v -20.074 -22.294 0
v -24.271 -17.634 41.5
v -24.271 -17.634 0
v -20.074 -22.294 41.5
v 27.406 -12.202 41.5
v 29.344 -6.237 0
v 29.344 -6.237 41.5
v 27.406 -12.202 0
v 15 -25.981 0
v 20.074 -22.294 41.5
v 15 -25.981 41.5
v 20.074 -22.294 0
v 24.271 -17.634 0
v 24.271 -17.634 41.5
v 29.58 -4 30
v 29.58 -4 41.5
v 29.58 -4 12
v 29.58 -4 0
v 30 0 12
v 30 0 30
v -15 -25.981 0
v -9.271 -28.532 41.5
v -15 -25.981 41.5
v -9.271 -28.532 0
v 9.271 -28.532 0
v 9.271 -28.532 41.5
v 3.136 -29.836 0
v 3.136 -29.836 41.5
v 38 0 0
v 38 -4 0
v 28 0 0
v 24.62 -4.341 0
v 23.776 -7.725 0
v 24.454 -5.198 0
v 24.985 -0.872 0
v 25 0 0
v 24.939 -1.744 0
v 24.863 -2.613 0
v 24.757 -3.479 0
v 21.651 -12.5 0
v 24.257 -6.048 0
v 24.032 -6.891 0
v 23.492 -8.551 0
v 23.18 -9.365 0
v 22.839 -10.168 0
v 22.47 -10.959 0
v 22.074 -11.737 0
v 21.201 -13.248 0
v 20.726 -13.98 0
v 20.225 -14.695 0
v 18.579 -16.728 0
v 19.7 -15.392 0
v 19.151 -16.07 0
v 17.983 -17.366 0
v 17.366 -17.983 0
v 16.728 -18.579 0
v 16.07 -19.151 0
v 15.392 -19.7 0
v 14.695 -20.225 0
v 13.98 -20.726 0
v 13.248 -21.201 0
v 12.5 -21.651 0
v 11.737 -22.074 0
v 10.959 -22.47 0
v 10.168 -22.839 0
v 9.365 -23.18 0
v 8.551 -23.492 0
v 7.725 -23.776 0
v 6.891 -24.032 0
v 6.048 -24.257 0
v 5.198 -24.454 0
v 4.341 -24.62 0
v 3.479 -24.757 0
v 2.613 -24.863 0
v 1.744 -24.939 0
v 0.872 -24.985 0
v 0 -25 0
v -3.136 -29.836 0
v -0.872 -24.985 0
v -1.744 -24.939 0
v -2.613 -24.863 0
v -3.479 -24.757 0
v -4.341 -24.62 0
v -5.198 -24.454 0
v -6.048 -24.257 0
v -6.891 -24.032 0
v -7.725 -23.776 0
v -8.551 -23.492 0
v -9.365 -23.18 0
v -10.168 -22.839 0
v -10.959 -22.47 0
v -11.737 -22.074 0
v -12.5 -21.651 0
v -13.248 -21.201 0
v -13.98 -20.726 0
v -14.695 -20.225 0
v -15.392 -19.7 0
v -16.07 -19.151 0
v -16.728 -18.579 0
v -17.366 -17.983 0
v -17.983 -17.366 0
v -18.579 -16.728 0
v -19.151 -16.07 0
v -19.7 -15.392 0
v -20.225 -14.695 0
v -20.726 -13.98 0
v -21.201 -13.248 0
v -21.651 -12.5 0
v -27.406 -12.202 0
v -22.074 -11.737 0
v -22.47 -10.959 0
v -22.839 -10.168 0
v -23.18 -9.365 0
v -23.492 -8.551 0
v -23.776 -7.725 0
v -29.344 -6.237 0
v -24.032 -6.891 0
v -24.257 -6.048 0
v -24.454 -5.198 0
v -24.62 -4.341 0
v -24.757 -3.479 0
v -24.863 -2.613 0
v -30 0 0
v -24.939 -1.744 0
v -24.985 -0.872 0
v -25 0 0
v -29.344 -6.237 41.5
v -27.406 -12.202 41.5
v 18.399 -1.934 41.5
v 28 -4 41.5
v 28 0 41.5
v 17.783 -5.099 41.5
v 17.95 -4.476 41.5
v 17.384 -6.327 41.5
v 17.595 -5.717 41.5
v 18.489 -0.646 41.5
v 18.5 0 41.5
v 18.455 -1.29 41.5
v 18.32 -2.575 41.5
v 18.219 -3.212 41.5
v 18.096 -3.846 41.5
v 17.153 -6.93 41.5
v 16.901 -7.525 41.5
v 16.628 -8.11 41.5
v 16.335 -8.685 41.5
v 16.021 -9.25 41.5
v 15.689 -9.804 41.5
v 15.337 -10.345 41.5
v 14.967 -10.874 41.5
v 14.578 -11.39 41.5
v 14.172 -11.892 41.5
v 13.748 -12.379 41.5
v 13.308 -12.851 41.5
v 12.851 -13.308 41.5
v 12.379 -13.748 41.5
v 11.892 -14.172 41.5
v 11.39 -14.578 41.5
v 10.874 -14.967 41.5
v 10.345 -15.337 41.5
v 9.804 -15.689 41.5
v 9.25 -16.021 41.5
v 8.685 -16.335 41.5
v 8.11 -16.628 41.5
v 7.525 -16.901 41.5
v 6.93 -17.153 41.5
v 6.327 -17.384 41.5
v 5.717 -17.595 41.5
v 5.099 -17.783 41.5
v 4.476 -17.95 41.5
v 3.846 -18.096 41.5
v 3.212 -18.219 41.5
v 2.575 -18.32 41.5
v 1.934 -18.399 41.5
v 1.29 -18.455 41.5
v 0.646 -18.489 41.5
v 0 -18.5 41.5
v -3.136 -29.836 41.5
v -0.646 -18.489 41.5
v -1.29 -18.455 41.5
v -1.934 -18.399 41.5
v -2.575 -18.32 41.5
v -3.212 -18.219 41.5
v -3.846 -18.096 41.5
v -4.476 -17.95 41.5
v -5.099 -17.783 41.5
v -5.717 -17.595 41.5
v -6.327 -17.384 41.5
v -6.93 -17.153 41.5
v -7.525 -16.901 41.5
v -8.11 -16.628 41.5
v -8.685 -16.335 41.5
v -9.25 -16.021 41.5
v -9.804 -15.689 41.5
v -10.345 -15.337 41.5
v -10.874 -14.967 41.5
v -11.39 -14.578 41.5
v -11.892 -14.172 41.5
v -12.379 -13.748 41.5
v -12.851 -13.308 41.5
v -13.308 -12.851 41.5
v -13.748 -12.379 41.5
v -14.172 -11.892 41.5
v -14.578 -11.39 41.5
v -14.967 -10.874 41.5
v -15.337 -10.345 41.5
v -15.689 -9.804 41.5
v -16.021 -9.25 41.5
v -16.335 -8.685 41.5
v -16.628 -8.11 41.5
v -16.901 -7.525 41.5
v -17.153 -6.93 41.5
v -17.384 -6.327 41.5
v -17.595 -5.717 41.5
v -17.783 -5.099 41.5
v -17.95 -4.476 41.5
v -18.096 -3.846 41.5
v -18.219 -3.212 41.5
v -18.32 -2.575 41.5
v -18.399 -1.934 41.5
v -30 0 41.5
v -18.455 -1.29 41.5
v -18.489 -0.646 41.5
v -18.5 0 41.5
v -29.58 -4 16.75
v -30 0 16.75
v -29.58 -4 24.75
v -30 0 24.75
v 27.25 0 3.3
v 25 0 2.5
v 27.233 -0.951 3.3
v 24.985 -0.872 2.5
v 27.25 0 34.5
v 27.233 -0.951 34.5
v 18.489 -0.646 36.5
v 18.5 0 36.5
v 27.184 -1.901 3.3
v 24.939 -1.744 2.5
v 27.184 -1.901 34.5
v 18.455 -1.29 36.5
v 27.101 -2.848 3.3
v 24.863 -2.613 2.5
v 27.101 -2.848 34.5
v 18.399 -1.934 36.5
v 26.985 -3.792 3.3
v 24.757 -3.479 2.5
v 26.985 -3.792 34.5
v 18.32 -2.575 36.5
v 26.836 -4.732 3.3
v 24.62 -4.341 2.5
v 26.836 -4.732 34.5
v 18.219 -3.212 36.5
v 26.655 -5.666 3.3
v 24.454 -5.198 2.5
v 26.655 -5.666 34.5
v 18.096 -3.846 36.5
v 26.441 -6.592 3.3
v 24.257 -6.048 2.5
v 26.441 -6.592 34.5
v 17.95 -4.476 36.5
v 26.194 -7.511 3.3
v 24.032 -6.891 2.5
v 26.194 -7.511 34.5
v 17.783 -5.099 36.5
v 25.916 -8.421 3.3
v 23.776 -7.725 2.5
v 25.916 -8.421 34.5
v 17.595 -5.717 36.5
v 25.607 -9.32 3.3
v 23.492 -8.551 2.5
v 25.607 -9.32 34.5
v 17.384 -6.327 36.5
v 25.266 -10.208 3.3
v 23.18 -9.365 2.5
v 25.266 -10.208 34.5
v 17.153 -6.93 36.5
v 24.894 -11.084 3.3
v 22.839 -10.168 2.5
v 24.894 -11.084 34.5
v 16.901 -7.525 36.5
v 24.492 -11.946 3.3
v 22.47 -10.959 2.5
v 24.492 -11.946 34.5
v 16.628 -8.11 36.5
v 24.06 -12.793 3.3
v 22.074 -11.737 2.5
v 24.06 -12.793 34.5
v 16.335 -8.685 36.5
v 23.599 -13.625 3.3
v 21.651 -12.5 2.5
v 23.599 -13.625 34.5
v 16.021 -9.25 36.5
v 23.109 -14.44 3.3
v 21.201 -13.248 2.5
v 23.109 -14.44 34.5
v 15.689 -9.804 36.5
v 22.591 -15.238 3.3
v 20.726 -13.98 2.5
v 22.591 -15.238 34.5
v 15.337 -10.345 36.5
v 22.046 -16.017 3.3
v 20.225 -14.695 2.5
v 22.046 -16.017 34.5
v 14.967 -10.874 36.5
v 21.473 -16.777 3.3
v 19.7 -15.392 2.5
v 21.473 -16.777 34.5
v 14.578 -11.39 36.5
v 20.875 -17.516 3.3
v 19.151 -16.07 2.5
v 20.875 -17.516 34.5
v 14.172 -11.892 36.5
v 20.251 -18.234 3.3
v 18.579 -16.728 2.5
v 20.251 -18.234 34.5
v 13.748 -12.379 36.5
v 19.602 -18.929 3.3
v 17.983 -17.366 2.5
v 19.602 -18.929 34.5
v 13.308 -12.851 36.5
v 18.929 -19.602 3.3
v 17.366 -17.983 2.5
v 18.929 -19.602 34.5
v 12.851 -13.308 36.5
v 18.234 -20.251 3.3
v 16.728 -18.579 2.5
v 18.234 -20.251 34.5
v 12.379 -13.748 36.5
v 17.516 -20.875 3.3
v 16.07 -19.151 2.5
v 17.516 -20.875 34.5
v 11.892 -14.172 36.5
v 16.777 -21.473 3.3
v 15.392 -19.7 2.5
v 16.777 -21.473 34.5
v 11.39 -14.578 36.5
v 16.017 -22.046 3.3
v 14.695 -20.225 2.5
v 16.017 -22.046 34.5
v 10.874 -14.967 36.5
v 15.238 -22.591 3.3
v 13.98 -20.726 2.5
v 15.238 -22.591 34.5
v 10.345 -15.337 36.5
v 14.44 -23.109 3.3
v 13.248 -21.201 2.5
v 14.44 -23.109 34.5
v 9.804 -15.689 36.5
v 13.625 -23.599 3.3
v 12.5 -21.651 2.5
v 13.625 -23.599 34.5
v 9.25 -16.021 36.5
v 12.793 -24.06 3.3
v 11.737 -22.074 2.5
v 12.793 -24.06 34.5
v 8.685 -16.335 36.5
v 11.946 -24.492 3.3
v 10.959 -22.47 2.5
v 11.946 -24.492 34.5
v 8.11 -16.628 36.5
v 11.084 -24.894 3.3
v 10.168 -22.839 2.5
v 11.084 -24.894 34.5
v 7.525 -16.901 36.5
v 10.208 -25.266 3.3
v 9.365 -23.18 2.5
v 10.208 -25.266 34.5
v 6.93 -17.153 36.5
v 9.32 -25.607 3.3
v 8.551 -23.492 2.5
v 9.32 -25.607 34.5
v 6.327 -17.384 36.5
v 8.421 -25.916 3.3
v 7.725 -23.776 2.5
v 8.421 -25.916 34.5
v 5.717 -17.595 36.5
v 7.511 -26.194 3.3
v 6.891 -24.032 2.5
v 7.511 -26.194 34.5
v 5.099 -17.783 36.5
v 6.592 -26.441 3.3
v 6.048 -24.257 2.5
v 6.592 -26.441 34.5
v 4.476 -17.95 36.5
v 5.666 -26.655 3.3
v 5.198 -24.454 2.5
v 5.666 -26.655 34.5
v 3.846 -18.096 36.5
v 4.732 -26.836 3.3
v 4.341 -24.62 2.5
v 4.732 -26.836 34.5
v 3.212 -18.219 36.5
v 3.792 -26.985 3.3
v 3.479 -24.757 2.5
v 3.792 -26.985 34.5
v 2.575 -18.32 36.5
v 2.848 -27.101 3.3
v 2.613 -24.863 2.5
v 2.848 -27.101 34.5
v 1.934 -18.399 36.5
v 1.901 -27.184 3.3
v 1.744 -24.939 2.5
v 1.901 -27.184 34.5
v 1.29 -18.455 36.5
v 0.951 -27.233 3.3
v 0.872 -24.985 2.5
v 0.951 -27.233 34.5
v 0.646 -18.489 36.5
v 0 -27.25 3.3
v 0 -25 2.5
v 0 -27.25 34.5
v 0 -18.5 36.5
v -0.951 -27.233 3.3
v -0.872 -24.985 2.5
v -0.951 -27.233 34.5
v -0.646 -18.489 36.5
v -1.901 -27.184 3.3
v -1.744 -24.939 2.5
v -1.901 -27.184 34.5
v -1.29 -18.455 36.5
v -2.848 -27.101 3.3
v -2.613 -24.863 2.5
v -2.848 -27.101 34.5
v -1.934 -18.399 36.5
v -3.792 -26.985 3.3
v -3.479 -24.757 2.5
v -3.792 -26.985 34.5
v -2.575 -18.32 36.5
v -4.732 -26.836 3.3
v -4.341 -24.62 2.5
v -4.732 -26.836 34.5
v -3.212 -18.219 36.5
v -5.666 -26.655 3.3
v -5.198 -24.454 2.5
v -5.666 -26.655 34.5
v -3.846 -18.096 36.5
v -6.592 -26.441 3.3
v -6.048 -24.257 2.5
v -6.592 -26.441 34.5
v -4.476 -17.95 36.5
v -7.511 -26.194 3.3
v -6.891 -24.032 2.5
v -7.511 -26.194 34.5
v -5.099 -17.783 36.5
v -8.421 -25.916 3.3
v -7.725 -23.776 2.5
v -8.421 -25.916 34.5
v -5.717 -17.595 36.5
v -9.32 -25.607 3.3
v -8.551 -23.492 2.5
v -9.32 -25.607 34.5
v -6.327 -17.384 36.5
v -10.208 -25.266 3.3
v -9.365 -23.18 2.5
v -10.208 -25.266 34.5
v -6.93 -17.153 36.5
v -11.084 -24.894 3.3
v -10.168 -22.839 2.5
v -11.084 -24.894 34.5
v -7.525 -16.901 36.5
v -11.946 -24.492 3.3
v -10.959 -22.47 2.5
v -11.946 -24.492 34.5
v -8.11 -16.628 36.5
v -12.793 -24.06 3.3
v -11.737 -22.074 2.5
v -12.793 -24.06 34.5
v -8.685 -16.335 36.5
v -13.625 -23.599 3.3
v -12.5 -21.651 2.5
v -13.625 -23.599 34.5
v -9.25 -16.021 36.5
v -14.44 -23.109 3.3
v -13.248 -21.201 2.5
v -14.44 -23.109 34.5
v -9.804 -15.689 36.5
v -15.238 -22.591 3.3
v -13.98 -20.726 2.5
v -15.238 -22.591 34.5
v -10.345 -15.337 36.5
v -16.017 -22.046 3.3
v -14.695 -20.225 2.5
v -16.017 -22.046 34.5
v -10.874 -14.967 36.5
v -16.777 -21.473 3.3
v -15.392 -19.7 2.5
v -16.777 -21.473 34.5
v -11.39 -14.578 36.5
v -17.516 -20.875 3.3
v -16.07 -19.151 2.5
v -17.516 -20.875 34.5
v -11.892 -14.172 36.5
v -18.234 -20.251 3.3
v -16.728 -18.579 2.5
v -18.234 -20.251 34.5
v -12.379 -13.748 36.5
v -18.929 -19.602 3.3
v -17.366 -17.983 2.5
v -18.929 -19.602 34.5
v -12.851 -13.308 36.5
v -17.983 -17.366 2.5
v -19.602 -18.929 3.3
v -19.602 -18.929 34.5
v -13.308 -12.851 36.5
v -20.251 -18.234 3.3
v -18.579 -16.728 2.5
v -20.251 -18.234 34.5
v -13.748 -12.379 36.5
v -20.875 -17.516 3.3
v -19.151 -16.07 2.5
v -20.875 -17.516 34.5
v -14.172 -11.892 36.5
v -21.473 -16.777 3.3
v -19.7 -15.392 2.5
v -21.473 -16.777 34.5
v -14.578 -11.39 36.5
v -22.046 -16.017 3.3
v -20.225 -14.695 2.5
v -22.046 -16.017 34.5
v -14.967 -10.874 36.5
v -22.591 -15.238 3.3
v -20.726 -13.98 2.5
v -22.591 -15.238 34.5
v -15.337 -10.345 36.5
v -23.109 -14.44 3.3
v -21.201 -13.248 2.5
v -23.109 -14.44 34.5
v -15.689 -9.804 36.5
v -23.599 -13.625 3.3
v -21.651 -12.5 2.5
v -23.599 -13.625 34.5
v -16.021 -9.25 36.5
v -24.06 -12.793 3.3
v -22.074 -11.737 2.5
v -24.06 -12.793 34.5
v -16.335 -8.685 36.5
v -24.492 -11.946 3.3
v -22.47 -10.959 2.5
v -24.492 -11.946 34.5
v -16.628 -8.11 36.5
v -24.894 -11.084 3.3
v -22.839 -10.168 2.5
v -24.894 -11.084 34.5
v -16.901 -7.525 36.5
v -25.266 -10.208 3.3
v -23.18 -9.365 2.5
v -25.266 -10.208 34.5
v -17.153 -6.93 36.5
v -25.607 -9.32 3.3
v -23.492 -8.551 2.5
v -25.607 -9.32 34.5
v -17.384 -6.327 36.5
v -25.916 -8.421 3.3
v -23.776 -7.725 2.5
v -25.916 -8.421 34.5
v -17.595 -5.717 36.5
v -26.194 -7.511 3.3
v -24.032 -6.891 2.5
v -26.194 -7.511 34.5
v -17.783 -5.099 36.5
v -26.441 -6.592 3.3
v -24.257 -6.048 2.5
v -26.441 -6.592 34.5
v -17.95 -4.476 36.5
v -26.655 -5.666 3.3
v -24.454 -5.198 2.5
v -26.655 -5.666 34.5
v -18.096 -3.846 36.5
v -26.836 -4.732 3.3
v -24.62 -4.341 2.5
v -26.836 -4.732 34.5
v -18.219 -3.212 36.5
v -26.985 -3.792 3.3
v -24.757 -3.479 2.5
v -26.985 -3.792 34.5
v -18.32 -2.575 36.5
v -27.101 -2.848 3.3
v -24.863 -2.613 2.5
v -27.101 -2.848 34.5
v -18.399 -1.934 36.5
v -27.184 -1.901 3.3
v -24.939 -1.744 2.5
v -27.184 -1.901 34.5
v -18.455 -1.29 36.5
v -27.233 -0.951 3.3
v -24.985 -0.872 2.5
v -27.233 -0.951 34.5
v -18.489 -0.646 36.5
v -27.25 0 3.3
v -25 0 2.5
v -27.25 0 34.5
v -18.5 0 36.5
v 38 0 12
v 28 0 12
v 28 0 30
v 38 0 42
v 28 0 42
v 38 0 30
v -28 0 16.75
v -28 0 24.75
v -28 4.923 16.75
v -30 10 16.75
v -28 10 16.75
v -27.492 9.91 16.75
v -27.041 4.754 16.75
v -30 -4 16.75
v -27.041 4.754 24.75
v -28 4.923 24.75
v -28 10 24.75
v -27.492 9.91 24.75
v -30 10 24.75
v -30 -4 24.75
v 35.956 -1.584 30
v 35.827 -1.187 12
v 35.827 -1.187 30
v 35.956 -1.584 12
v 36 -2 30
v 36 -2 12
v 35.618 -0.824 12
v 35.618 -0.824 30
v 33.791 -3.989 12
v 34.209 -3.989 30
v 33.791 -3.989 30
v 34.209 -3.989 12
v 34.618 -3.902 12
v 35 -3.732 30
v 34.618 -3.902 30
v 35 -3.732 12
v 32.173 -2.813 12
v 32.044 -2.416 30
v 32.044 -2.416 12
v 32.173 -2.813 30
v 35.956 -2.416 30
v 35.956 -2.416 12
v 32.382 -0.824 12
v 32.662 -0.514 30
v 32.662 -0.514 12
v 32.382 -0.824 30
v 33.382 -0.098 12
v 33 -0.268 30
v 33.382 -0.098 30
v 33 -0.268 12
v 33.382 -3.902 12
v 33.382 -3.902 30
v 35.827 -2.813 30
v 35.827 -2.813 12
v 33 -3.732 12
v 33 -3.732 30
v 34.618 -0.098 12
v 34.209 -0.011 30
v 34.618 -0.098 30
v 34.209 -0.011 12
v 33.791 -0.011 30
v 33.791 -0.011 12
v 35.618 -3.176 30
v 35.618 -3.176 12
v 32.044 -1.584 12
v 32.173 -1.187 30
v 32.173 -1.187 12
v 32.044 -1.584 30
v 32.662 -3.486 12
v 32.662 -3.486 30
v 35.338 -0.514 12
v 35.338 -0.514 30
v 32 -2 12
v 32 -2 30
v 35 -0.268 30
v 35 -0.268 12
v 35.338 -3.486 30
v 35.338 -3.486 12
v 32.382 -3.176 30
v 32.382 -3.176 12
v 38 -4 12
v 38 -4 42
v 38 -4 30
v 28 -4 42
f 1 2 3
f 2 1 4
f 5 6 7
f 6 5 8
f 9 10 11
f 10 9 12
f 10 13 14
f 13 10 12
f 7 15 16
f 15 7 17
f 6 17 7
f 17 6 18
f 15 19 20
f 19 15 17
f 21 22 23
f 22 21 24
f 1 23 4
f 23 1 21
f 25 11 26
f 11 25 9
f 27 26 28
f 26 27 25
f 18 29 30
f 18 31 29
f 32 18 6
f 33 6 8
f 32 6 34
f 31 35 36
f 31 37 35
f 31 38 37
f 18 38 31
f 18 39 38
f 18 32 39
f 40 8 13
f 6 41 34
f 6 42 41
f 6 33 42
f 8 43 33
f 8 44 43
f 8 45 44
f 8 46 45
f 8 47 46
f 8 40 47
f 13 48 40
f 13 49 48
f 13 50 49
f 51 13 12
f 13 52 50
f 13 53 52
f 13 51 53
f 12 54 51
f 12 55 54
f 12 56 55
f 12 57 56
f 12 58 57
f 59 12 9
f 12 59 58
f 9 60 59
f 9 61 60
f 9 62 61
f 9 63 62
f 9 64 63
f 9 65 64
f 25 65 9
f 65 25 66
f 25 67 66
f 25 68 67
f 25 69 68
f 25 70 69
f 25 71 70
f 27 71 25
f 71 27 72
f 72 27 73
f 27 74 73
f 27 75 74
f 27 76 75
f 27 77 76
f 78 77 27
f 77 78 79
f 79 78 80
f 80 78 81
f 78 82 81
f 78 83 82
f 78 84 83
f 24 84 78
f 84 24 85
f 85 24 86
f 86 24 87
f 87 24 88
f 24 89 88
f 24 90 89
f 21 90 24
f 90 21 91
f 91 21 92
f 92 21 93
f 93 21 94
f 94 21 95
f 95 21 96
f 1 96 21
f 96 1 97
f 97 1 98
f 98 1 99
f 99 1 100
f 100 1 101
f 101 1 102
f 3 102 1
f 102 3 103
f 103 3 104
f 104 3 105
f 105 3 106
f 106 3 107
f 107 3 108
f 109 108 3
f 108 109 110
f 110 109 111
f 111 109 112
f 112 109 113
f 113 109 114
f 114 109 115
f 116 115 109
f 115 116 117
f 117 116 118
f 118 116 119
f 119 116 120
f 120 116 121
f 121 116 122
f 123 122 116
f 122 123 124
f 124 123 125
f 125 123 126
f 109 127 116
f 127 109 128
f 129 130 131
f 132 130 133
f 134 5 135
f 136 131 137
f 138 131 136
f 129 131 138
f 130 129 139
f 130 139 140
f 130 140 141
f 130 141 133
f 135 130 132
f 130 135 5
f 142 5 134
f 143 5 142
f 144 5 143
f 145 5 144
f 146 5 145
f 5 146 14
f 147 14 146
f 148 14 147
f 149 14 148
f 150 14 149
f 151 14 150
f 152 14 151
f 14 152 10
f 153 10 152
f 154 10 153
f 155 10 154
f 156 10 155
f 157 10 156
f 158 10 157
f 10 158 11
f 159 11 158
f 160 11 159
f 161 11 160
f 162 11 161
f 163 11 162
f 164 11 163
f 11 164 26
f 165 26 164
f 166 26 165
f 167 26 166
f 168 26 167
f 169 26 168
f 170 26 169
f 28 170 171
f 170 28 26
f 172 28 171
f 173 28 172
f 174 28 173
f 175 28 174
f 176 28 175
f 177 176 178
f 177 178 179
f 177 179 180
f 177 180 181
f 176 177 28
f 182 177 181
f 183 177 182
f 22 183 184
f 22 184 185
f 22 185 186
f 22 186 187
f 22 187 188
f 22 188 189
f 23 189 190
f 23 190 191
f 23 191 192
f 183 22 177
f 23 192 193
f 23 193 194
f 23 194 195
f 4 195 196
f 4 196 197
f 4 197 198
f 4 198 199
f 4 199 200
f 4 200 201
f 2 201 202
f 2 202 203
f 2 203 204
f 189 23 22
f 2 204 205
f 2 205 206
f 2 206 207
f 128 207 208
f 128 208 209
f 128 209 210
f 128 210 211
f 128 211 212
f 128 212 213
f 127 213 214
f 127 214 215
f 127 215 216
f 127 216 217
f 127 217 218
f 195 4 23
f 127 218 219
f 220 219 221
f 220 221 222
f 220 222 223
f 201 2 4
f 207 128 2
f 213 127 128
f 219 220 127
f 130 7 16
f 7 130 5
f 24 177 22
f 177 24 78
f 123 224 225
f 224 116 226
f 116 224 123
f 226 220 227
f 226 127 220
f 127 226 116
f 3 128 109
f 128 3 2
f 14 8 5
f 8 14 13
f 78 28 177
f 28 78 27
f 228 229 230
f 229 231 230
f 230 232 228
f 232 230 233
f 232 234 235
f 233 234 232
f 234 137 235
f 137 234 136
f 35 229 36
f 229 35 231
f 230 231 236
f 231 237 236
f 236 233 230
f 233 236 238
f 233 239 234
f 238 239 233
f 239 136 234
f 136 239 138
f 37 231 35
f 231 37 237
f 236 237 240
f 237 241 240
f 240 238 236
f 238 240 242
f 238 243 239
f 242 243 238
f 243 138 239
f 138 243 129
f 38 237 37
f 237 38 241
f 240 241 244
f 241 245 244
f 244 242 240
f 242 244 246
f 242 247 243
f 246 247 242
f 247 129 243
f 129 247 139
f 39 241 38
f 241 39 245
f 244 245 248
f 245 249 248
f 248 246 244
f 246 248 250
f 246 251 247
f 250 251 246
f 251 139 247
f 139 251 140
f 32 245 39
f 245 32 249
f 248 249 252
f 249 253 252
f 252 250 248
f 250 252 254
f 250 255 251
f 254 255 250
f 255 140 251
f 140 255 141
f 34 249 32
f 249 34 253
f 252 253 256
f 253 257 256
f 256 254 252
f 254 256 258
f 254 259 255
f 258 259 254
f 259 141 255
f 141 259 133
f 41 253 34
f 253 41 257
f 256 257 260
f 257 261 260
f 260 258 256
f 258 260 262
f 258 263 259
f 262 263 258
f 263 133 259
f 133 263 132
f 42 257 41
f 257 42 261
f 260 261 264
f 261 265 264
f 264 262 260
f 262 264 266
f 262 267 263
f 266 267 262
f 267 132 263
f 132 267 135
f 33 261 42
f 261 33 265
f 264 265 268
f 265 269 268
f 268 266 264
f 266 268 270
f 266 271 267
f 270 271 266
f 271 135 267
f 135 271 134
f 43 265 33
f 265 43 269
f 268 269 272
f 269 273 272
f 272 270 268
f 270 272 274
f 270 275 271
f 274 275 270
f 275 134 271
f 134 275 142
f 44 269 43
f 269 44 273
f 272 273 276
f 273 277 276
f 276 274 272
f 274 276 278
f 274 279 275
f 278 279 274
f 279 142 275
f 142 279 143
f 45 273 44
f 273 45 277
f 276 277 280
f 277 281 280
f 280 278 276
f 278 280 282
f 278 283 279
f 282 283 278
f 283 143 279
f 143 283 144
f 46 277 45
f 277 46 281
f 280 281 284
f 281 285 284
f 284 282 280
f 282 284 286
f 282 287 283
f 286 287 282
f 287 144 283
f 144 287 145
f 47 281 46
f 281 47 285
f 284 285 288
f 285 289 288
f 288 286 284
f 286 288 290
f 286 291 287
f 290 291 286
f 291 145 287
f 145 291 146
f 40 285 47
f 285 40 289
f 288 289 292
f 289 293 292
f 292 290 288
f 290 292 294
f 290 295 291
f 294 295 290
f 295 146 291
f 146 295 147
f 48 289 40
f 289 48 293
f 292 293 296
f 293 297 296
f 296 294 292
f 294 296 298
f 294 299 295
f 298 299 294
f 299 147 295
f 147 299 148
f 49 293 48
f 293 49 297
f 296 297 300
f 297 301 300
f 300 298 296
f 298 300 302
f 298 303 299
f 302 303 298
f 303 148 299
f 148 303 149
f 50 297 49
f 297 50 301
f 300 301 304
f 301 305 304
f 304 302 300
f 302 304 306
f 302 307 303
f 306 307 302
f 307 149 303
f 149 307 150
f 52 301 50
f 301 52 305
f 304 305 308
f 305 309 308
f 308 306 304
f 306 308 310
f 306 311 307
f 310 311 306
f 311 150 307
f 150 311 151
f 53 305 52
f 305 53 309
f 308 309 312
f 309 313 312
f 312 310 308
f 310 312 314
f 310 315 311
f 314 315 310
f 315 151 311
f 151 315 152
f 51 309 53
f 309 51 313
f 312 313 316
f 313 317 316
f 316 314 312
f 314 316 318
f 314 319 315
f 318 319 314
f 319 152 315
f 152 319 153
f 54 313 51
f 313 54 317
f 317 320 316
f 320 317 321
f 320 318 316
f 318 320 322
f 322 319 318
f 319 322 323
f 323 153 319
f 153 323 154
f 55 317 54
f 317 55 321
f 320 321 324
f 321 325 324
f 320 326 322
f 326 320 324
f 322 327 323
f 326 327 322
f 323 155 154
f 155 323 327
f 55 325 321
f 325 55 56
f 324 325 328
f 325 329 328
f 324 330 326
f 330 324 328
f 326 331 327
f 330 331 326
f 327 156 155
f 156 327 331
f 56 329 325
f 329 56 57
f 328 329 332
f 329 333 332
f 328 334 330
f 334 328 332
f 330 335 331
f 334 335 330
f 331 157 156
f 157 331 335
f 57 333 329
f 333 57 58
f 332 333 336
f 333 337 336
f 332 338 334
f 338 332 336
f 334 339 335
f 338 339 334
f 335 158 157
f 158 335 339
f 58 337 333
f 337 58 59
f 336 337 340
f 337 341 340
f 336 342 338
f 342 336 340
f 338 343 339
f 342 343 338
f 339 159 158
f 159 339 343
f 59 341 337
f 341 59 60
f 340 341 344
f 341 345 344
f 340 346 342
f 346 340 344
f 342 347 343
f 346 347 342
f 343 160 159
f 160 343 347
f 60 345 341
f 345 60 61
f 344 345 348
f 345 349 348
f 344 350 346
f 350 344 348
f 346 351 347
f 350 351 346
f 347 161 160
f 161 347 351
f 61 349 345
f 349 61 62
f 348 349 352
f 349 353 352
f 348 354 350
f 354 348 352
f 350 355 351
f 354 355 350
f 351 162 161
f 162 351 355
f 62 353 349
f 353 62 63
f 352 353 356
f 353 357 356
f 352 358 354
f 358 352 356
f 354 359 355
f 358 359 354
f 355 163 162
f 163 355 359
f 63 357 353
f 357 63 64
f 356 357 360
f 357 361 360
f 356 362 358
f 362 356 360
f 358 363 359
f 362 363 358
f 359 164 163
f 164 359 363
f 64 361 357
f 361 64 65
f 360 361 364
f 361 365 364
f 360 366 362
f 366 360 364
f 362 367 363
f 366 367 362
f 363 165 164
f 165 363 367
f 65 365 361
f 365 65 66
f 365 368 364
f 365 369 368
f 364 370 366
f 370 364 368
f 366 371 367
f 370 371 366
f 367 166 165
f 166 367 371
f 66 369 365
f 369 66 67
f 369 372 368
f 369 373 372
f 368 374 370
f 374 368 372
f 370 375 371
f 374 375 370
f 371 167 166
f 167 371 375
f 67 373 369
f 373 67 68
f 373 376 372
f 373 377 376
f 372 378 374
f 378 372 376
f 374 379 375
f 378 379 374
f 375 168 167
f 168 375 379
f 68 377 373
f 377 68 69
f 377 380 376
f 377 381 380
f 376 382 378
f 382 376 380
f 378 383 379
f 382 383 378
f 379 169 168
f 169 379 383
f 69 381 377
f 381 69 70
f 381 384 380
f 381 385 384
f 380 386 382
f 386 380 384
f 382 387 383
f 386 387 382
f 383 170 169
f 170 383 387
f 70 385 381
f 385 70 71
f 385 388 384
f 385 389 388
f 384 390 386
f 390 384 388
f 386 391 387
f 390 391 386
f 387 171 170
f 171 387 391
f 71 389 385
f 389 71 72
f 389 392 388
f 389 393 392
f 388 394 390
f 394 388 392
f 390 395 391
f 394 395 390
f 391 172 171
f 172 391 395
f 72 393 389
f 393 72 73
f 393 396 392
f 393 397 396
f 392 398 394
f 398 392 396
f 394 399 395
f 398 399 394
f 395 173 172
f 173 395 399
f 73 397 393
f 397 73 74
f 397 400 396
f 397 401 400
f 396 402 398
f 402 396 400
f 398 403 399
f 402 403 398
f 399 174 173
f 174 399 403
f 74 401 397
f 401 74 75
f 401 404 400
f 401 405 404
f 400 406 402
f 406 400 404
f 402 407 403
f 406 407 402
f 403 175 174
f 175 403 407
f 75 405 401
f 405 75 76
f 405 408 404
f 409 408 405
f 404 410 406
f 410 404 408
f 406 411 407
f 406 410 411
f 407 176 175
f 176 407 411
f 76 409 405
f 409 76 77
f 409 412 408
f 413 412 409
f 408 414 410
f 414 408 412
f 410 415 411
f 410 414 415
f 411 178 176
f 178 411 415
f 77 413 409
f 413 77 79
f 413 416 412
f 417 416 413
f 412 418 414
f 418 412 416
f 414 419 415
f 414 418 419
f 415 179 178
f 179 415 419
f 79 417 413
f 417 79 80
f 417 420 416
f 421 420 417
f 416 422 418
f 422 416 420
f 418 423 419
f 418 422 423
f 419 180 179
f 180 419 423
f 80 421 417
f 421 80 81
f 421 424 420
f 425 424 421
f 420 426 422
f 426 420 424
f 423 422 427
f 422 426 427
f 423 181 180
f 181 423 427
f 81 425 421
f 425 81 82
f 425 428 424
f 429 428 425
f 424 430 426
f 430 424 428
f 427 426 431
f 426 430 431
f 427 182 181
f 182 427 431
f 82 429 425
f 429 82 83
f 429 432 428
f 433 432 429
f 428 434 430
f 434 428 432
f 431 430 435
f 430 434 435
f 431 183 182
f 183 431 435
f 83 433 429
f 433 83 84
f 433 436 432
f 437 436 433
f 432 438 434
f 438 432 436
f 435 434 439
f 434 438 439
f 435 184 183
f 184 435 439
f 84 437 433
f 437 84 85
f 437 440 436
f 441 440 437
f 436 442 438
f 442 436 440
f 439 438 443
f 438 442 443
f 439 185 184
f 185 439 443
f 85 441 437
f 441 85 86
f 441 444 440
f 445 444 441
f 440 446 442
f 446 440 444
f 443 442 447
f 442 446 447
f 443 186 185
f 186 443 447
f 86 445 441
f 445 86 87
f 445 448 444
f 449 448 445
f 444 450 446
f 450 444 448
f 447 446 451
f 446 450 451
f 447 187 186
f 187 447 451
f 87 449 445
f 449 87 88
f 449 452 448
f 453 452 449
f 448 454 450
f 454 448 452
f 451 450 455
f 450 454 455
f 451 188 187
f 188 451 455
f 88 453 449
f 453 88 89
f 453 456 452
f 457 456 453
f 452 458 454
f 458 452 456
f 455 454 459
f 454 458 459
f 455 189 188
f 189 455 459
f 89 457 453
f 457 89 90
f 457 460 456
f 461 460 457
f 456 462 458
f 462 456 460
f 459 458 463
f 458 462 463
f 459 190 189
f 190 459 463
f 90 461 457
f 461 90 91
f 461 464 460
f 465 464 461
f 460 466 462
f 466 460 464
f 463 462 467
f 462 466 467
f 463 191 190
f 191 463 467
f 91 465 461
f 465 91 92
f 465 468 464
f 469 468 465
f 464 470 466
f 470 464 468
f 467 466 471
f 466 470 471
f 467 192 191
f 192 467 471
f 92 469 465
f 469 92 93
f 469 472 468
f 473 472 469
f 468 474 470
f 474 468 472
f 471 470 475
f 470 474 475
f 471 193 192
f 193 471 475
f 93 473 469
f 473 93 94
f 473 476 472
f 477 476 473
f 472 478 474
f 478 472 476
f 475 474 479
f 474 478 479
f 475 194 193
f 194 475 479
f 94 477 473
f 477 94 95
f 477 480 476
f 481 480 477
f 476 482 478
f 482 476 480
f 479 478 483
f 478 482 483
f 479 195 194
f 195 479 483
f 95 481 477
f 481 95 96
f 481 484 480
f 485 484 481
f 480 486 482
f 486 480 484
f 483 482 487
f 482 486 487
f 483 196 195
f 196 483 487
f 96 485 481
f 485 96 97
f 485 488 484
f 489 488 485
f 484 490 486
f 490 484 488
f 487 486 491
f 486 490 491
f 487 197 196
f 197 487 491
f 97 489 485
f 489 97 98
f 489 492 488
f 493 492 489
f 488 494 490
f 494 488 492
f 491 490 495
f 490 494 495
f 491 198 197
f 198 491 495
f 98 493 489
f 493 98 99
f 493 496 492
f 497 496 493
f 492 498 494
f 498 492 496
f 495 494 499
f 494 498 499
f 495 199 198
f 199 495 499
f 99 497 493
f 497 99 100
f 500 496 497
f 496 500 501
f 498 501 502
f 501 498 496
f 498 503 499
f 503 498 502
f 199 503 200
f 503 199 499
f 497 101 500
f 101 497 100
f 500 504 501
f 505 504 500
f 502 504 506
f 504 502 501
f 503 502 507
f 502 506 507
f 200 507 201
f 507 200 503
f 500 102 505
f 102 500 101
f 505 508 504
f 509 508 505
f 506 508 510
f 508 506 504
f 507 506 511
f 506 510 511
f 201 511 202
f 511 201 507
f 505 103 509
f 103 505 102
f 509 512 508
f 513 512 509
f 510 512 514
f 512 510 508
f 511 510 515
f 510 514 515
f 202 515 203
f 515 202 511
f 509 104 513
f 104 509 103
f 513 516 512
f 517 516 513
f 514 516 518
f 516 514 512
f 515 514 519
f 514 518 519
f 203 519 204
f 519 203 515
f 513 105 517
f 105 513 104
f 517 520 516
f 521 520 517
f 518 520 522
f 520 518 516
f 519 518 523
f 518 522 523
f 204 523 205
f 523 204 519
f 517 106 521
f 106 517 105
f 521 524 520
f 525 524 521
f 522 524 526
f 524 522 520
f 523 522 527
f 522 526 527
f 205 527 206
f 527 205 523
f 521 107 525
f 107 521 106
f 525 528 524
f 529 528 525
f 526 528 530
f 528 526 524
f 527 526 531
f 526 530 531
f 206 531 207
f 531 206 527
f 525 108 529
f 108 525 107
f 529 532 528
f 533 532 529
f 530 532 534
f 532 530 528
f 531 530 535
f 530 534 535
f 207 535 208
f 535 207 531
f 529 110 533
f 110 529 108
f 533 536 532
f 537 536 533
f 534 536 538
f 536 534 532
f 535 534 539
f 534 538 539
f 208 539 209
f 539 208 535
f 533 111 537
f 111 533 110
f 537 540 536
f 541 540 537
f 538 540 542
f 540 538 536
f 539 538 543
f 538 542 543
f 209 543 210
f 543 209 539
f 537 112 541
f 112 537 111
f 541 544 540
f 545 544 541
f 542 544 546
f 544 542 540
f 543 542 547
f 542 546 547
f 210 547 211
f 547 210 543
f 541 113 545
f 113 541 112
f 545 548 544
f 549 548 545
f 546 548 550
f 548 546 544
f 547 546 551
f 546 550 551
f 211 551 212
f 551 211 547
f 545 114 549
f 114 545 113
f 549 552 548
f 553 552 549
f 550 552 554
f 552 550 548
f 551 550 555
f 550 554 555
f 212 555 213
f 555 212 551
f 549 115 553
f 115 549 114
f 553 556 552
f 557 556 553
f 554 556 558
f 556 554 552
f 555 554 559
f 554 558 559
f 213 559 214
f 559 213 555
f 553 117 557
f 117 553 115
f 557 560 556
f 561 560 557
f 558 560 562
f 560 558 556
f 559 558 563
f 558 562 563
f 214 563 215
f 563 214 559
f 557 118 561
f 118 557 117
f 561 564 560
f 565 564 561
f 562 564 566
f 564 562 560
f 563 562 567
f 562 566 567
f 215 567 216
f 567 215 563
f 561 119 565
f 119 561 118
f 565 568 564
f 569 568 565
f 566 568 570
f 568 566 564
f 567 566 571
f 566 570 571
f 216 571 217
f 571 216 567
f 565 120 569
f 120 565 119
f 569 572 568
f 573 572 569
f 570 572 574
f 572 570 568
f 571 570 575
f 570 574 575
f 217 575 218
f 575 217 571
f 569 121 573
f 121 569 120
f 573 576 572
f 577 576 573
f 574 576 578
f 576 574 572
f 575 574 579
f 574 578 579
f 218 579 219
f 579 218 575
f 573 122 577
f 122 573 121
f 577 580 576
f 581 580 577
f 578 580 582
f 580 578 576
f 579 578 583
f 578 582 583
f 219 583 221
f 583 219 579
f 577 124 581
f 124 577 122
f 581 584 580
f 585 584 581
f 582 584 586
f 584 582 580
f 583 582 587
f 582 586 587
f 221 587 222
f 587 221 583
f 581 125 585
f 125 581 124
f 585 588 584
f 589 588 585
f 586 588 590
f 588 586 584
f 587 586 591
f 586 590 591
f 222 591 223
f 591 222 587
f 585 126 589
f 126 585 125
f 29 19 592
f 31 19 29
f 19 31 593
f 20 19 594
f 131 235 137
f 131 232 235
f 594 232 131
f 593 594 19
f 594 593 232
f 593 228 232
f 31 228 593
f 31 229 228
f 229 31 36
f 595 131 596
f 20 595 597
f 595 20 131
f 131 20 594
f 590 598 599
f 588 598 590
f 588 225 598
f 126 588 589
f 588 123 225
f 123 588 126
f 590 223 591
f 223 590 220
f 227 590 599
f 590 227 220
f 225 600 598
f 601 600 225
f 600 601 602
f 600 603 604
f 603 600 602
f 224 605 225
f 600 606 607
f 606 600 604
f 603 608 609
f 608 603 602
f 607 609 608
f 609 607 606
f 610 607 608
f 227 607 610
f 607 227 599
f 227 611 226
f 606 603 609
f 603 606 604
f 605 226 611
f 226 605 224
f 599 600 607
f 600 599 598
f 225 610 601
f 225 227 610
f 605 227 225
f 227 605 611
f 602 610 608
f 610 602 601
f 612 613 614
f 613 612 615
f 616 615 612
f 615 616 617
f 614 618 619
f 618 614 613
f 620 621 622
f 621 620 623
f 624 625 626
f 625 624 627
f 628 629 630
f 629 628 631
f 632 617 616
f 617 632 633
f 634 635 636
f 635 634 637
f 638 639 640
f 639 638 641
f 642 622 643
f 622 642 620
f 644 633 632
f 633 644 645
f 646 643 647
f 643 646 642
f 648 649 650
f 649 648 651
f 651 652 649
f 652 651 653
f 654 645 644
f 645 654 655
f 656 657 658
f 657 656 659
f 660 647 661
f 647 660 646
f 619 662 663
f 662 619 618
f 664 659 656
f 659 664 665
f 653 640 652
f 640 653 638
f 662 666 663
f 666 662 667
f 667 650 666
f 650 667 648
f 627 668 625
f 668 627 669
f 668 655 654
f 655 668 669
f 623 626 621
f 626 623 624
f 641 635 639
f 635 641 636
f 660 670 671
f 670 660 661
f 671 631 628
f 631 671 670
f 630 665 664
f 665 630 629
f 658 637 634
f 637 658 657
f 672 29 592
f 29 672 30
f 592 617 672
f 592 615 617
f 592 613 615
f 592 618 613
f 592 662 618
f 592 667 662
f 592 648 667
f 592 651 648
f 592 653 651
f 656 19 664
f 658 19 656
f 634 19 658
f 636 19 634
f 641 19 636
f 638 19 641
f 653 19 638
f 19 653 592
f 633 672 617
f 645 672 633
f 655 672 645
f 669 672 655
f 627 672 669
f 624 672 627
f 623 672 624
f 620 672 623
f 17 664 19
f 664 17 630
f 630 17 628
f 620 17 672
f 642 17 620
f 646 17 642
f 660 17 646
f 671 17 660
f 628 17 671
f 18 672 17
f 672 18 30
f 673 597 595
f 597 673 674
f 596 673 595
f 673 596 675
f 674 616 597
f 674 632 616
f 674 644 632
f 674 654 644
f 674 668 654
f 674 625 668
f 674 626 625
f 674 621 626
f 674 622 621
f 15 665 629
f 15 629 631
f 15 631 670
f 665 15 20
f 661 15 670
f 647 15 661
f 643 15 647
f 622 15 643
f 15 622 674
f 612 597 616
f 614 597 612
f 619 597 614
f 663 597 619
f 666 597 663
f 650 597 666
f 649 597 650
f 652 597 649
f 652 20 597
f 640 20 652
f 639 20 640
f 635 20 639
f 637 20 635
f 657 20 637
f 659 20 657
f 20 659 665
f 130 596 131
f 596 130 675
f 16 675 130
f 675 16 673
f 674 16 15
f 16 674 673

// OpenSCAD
    r1=25;
    r2=27.25;
    r3=18.5;
    h1=2.5;
    h2=34;
    h3=5;
    sb=7; // stripsbredde
    
    /*
    module feste() {
        union() {
            cube([
    }
    */
module kropp() {
    profil = [
        [0,0],              // 0
        [r1,0],             // 1
        [r1,h1],            // 2
        [r2,h1+.8],         // 3
        [r2,h1+h2-2],       // 4
        [r3,h1+h2],         // 5
        [r3,h1+h2+h3],      // 6
        [0,h1+h2+h3]        // 7
    ];

    difference() {
        cylinder(r=30,h=h1+h2+h3);
        rotate_extrude($fn=180, angle=360, convexity = 2)
            polygon(profil);
        translate([-50,0,0]) cube([100,50,50]);
		
        
    }
}
module snap() {
	cube([14,8,2]);
	difference(){
		translate([0,0,2])rotate([0,10,0])cube([5,8,2]);
		translate([0,-1,2.5])rotate([0,-5,0])cube([8,10,2]);
	}
}
kropp();
translate([31,-4,0]){
	translate([3,2,0])cylinder(h=h1+h2+h3,r=2,$fn=30);
	translate([-3,0,0])cube([10,4,12] );
	translate([-3,0,30])cube([10,4,12]);
	translate([-3,0,-30]) cube([4,10,-8]);
	translate([-61,14,(h1+h2+h3)/2+4])rotate([90,180,90])snap();
	
	
	
}
